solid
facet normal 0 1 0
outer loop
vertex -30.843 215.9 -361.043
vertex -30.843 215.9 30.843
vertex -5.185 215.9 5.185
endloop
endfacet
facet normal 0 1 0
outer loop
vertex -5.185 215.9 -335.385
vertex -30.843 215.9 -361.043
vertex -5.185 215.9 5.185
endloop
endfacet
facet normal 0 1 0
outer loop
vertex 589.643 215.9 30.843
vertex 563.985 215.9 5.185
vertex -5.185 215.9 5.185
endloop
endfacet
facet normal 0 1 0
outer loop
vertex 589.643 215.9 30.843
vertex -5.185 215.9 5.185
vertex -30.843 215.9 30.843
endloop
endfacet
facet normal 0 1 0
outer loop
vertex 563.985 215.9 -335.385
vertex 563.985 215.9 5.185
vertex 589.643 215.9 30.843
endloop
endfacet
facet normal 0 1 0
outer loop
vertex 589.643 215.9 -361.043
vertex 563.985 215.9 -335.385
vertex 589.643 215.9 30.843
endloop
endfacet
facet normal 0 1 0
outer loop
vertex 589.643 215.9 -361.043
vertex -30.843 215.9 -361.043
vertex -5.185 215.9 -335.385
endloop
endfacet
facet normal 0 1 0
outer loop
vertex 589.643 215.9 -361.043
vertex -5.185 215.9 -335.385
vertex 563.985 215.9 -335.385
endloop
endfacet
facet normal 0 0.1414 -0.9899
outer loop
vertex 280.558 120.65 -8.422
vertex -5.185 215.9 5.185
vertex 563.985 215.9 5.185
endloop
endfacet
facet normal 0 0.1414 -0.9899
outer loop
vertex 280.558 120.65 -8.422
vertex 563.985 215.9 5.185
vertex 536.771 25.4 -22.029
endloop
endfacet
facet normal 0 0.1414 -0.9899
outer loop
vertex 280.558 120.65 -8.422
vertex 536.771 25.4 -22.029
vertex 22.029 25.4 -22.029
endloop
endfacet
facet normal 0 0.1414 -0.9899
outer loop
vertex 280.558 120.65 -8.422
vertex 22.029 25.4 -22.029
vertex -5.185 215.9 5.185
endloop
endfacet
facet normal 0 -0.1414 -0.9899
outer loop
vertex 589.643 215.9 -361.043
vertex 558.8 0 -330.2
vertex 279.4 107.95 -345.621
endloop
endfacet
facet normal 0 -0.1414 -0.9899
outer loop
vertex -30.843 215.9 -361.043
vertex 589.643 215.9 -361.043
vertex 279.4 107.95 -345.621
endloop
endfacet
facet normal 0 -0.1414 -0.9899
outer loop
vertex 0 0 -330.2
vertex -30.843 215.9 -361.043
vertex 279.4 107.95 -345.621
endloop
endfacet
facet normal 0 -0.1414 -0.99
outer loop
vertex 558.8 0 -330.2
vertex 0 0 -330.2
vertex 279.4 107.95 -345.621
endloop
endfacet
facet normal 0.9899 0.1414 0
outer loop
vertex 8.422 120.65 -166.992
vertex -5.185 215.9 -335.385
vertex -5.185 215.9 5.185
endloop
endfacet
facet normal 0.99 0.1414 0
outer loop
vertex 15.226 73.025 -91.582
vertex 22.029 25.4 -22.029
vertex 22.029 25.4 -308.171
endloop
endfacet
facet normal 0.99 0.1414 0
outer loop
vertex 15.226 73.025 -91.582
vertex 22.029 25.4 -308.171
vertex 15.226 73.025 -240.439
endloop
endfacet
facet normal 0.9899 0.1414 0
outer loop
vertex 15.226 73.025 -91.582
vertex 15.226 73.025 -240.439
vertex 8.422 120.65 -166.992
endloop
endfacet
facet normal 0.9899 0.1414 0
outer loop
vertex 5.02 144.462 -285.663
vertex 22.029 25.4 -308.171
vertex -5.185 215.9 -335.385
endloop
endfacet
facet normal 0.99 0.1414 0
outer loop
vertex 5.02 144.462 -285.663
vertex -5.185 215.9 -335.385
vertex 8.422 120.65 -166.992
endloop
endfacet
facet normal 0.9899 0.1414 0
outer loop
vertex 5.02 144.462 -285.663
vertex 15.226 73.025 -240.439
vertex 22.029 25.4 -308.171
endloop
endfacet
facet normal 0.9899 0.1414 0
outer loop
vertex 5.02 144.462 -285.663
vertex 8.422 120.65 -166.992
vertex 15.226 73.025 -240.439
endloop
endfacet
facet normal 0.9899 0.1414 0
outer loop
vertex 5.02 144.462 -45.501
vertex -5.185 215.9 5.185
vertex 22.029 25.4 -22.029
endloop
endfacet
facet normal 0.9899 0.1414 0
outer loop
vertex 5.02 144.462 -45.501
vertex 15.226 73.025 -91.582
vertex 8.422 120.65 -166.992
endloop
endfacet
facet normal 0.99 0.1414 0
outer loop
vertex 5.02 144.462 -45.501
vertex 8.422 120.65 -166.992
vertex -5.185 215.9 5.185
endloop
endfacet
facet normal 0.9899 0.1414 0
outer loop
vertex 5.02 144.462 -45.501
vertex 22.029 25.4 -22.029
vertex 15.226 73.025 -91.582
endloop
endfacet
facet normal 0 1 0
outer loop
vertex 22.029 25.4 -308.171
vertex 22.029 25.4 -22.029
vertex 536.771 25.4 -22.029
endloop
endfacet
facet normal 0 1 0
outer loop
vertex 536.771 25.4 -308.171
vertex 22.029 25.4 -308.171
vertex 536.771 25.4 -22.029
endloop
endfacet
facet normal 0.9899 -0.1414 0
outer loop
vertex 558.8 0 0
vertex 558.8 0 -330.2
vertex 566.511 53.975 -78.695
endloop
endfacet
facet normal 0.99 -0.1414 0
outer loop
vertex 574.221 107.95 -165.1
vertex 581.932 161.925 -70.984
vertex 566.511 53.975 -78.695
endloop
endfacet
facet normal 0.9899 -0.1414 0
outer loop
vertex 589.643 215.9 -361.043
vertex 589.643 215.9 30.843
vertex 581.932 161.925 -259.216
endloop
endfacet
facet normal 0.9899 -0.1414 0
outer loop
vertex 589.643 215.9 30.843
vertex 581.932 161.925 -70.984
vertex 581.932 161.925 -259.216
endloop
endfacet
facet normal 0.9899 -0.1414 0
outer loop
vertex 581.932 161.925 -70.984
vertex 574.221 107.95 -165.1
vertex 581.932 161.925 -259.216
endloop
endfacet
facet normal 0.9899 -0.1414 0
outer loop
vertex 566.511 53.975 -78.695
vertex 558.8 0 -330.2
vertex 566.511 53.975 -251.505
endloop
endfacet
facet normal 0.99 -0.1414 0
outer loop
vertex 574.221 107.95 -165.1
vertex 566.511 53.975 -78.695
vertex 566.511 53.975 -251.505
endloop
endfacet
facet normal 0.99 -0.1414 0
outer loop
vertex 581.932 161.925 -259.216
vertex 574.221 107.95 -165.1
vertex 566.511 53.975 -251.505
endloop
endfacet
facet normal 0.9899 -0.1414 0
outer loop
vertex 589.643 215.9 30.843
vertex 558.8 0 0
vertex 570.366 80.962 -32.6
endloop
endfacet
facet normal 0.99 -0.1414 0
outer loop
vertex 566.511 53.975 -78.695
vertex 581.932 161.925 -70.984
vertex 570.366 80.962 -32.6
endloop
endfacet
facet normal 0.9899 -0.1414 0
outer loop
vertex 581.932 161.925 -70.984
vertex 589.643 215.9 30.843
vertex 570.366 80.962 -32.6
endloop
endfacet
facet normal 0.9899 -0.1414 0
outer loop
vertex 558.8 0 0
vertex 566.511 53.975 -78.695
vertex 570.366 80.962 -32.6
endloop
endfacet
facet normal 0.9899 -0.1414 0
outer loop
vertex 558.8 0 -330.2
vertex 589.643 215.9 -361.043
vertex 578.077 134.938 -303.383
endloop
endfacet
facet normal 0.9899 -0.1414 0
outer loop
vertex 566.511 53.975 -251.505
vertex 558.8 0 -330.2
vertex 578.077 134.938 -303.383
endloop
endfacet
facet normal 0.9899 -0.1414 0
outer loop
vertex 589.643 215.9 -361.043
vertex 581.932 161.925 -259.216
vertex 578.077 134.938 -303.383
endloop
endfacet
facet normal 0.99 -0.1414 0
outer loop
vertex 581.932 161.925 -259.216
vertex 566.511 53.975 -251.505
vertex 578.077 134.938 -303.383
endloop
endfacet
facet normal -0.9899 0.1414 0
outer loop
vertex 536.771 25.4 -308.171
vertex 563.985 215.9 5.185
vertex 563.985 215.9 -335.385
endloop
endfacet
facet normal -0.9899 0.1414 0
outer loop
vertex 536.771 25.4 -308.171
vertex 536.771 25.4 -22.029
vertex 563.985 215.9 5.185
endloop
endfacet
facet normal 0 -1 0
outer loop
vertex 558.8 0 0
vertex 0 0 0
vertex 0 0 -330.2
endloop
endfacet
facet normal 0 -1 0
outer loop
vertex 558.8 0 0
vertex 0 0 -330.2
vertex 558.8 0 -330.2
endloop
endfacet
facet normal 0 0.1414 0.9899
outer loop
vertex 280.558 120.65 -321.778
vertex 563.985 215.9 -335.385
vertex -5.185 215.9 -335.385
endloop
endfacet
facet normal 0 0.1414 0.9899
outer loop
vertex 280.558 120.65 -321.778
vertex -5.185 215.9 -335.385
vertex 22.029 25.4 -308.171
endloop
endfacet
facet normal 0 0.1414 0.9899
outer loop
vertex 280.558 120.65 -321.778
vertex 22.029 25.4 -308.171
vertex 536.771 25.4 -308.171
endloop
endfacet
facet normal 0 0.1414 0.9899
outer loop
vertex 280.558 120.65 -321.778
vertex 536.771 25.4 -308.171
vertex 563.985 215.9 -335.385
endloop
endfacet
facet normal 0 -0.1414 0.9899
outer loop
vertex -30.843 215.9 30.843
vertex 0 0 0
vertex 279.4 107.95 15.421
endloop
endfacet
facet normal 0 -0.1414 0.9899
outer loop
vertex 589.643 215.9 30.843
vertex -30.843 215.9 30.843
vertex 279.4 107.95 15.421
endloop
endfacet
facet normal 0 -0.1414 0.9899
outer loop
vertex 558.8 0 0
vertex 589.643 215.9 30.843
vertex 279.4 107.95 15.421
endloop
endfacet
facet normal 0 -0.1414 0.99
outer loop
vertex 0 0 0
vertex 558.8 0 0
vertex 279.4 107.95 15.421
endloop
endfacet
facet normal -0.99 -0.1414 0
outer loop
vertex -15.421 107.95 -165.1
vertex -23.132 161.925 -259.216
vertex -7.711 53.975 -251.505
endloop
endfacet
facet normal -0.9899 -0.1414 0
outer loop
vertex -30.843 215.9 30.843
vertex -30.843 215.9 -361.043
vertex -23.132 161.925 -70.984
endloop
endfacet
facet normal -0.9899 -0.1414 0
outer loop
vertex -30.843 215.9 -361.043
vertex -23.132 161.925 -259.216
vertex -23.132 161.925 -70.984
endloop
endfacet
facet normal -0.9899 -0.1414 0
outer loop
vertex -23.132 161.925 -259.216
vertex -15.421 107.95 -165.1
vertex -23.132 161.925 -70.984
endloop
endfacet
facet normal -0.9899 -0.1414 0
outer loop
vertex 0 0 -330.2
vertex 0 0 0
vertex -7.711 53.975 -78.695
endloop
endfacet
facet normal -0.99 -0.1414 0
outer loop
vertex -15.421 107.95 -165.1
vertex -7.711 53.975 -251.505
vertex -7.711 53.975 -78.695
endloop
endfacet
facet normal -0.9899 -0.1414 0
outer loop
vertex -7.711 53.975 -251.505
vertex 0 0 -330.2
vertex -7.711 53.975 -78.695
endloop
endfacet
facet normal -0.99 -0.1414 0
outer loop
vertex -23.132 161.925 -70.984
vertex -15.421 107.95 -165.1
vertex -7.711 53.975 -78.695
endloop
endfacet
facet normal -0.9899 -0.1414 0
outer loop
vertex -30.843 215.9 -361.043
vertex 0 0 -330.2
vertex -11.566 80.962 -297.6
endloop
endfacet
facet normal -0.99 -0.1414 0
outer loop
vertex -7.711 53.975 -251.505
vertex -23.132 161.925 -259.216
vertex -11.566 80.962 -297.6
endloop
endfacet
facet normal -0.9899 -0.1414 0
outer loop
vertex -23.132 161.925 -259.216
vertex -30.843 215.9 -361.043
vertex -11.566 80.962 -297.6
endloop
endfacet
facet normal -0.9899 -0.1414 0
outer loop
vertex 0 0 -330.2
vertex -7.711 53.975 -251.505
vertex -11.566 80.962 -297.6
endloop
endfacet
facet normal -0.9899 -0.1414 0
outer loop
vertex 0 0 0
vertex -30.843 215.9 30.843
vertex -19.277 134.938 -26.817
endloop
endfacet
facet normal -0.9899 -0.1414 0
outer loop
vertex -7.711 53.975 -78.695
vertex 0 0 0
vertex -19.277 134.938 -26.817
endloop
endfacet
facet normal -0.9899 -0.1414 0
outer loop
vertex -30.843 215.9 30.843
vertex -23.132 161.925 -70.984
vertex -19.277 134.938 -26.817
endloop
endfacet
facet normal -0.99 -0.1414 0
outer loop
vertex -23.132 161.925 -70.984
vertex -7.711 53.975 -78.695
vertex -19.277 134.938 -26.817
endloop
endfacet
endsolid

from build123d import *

# Parameters (mm, degrees)
SHELL1_T           = -25.4
SKETCH5_W          = 929.67589299
SKETCH5_H          = 559.095756772
CUT_EXTRUDE1_DEPTH = 50.8


with BuildPart() as part:
    # Sketch2 → Loft1 section 0
    with BuildSketch(Plane(origin=(0, 266.7, 0), x_dir=(1, 0, 0), z_dir=(0, 1, 0))):
        with BuildLine():
            Line((-38.1, -38.1), (596.9, -38.1))
            Line((596.9, -38.1), (596.9, 368.3))
            Line((596.9, 368.3), (-38.1, 368.3))
            Line((-38.1, 368.3), (-38.1, -38.1))
        make_face()
    # Sketch1 → Loft1 section 1
    with BuildSketch(Plane(origin=(0, 0, 0), x_dir=(1, 0, 0), z_dir=(0, 1, 0))):
        with BuildLine():
            Line((0, 0), (558.8, 0))
            Line((558.8, 0), (558.8, 330.2))
            Line((558.8, 330.2), (0, 330.2))
            Line((0, 330.2), (0, 0))
        make_face()
    loft()

    # Shell1
    shell1_openings = [part.faces().sort_by_distance(p)[0] for p in [
        (279.4, 266.7, -165.1),
    ]]
    offset(amount=SHELL1_T, openings=shell1_openings, kind=Kind.INTERSECTION)

    # Sketch5 → Cut-Extrude1 (cut)
    with BuildSketch(Plane(origin=(0, 215.9, 0), x_dir=(1, 0, 0), z_dir=(0, 1, 0))):
        with Locations((273.30728983, 168.325552443)):
            Rectangle(SKETCH5_W, SKETCH5_H)
    extrude(amount=CUT_EXTRUDE1_DEPTH, mode=Mode.SUBTRACT)


solid = part.part
